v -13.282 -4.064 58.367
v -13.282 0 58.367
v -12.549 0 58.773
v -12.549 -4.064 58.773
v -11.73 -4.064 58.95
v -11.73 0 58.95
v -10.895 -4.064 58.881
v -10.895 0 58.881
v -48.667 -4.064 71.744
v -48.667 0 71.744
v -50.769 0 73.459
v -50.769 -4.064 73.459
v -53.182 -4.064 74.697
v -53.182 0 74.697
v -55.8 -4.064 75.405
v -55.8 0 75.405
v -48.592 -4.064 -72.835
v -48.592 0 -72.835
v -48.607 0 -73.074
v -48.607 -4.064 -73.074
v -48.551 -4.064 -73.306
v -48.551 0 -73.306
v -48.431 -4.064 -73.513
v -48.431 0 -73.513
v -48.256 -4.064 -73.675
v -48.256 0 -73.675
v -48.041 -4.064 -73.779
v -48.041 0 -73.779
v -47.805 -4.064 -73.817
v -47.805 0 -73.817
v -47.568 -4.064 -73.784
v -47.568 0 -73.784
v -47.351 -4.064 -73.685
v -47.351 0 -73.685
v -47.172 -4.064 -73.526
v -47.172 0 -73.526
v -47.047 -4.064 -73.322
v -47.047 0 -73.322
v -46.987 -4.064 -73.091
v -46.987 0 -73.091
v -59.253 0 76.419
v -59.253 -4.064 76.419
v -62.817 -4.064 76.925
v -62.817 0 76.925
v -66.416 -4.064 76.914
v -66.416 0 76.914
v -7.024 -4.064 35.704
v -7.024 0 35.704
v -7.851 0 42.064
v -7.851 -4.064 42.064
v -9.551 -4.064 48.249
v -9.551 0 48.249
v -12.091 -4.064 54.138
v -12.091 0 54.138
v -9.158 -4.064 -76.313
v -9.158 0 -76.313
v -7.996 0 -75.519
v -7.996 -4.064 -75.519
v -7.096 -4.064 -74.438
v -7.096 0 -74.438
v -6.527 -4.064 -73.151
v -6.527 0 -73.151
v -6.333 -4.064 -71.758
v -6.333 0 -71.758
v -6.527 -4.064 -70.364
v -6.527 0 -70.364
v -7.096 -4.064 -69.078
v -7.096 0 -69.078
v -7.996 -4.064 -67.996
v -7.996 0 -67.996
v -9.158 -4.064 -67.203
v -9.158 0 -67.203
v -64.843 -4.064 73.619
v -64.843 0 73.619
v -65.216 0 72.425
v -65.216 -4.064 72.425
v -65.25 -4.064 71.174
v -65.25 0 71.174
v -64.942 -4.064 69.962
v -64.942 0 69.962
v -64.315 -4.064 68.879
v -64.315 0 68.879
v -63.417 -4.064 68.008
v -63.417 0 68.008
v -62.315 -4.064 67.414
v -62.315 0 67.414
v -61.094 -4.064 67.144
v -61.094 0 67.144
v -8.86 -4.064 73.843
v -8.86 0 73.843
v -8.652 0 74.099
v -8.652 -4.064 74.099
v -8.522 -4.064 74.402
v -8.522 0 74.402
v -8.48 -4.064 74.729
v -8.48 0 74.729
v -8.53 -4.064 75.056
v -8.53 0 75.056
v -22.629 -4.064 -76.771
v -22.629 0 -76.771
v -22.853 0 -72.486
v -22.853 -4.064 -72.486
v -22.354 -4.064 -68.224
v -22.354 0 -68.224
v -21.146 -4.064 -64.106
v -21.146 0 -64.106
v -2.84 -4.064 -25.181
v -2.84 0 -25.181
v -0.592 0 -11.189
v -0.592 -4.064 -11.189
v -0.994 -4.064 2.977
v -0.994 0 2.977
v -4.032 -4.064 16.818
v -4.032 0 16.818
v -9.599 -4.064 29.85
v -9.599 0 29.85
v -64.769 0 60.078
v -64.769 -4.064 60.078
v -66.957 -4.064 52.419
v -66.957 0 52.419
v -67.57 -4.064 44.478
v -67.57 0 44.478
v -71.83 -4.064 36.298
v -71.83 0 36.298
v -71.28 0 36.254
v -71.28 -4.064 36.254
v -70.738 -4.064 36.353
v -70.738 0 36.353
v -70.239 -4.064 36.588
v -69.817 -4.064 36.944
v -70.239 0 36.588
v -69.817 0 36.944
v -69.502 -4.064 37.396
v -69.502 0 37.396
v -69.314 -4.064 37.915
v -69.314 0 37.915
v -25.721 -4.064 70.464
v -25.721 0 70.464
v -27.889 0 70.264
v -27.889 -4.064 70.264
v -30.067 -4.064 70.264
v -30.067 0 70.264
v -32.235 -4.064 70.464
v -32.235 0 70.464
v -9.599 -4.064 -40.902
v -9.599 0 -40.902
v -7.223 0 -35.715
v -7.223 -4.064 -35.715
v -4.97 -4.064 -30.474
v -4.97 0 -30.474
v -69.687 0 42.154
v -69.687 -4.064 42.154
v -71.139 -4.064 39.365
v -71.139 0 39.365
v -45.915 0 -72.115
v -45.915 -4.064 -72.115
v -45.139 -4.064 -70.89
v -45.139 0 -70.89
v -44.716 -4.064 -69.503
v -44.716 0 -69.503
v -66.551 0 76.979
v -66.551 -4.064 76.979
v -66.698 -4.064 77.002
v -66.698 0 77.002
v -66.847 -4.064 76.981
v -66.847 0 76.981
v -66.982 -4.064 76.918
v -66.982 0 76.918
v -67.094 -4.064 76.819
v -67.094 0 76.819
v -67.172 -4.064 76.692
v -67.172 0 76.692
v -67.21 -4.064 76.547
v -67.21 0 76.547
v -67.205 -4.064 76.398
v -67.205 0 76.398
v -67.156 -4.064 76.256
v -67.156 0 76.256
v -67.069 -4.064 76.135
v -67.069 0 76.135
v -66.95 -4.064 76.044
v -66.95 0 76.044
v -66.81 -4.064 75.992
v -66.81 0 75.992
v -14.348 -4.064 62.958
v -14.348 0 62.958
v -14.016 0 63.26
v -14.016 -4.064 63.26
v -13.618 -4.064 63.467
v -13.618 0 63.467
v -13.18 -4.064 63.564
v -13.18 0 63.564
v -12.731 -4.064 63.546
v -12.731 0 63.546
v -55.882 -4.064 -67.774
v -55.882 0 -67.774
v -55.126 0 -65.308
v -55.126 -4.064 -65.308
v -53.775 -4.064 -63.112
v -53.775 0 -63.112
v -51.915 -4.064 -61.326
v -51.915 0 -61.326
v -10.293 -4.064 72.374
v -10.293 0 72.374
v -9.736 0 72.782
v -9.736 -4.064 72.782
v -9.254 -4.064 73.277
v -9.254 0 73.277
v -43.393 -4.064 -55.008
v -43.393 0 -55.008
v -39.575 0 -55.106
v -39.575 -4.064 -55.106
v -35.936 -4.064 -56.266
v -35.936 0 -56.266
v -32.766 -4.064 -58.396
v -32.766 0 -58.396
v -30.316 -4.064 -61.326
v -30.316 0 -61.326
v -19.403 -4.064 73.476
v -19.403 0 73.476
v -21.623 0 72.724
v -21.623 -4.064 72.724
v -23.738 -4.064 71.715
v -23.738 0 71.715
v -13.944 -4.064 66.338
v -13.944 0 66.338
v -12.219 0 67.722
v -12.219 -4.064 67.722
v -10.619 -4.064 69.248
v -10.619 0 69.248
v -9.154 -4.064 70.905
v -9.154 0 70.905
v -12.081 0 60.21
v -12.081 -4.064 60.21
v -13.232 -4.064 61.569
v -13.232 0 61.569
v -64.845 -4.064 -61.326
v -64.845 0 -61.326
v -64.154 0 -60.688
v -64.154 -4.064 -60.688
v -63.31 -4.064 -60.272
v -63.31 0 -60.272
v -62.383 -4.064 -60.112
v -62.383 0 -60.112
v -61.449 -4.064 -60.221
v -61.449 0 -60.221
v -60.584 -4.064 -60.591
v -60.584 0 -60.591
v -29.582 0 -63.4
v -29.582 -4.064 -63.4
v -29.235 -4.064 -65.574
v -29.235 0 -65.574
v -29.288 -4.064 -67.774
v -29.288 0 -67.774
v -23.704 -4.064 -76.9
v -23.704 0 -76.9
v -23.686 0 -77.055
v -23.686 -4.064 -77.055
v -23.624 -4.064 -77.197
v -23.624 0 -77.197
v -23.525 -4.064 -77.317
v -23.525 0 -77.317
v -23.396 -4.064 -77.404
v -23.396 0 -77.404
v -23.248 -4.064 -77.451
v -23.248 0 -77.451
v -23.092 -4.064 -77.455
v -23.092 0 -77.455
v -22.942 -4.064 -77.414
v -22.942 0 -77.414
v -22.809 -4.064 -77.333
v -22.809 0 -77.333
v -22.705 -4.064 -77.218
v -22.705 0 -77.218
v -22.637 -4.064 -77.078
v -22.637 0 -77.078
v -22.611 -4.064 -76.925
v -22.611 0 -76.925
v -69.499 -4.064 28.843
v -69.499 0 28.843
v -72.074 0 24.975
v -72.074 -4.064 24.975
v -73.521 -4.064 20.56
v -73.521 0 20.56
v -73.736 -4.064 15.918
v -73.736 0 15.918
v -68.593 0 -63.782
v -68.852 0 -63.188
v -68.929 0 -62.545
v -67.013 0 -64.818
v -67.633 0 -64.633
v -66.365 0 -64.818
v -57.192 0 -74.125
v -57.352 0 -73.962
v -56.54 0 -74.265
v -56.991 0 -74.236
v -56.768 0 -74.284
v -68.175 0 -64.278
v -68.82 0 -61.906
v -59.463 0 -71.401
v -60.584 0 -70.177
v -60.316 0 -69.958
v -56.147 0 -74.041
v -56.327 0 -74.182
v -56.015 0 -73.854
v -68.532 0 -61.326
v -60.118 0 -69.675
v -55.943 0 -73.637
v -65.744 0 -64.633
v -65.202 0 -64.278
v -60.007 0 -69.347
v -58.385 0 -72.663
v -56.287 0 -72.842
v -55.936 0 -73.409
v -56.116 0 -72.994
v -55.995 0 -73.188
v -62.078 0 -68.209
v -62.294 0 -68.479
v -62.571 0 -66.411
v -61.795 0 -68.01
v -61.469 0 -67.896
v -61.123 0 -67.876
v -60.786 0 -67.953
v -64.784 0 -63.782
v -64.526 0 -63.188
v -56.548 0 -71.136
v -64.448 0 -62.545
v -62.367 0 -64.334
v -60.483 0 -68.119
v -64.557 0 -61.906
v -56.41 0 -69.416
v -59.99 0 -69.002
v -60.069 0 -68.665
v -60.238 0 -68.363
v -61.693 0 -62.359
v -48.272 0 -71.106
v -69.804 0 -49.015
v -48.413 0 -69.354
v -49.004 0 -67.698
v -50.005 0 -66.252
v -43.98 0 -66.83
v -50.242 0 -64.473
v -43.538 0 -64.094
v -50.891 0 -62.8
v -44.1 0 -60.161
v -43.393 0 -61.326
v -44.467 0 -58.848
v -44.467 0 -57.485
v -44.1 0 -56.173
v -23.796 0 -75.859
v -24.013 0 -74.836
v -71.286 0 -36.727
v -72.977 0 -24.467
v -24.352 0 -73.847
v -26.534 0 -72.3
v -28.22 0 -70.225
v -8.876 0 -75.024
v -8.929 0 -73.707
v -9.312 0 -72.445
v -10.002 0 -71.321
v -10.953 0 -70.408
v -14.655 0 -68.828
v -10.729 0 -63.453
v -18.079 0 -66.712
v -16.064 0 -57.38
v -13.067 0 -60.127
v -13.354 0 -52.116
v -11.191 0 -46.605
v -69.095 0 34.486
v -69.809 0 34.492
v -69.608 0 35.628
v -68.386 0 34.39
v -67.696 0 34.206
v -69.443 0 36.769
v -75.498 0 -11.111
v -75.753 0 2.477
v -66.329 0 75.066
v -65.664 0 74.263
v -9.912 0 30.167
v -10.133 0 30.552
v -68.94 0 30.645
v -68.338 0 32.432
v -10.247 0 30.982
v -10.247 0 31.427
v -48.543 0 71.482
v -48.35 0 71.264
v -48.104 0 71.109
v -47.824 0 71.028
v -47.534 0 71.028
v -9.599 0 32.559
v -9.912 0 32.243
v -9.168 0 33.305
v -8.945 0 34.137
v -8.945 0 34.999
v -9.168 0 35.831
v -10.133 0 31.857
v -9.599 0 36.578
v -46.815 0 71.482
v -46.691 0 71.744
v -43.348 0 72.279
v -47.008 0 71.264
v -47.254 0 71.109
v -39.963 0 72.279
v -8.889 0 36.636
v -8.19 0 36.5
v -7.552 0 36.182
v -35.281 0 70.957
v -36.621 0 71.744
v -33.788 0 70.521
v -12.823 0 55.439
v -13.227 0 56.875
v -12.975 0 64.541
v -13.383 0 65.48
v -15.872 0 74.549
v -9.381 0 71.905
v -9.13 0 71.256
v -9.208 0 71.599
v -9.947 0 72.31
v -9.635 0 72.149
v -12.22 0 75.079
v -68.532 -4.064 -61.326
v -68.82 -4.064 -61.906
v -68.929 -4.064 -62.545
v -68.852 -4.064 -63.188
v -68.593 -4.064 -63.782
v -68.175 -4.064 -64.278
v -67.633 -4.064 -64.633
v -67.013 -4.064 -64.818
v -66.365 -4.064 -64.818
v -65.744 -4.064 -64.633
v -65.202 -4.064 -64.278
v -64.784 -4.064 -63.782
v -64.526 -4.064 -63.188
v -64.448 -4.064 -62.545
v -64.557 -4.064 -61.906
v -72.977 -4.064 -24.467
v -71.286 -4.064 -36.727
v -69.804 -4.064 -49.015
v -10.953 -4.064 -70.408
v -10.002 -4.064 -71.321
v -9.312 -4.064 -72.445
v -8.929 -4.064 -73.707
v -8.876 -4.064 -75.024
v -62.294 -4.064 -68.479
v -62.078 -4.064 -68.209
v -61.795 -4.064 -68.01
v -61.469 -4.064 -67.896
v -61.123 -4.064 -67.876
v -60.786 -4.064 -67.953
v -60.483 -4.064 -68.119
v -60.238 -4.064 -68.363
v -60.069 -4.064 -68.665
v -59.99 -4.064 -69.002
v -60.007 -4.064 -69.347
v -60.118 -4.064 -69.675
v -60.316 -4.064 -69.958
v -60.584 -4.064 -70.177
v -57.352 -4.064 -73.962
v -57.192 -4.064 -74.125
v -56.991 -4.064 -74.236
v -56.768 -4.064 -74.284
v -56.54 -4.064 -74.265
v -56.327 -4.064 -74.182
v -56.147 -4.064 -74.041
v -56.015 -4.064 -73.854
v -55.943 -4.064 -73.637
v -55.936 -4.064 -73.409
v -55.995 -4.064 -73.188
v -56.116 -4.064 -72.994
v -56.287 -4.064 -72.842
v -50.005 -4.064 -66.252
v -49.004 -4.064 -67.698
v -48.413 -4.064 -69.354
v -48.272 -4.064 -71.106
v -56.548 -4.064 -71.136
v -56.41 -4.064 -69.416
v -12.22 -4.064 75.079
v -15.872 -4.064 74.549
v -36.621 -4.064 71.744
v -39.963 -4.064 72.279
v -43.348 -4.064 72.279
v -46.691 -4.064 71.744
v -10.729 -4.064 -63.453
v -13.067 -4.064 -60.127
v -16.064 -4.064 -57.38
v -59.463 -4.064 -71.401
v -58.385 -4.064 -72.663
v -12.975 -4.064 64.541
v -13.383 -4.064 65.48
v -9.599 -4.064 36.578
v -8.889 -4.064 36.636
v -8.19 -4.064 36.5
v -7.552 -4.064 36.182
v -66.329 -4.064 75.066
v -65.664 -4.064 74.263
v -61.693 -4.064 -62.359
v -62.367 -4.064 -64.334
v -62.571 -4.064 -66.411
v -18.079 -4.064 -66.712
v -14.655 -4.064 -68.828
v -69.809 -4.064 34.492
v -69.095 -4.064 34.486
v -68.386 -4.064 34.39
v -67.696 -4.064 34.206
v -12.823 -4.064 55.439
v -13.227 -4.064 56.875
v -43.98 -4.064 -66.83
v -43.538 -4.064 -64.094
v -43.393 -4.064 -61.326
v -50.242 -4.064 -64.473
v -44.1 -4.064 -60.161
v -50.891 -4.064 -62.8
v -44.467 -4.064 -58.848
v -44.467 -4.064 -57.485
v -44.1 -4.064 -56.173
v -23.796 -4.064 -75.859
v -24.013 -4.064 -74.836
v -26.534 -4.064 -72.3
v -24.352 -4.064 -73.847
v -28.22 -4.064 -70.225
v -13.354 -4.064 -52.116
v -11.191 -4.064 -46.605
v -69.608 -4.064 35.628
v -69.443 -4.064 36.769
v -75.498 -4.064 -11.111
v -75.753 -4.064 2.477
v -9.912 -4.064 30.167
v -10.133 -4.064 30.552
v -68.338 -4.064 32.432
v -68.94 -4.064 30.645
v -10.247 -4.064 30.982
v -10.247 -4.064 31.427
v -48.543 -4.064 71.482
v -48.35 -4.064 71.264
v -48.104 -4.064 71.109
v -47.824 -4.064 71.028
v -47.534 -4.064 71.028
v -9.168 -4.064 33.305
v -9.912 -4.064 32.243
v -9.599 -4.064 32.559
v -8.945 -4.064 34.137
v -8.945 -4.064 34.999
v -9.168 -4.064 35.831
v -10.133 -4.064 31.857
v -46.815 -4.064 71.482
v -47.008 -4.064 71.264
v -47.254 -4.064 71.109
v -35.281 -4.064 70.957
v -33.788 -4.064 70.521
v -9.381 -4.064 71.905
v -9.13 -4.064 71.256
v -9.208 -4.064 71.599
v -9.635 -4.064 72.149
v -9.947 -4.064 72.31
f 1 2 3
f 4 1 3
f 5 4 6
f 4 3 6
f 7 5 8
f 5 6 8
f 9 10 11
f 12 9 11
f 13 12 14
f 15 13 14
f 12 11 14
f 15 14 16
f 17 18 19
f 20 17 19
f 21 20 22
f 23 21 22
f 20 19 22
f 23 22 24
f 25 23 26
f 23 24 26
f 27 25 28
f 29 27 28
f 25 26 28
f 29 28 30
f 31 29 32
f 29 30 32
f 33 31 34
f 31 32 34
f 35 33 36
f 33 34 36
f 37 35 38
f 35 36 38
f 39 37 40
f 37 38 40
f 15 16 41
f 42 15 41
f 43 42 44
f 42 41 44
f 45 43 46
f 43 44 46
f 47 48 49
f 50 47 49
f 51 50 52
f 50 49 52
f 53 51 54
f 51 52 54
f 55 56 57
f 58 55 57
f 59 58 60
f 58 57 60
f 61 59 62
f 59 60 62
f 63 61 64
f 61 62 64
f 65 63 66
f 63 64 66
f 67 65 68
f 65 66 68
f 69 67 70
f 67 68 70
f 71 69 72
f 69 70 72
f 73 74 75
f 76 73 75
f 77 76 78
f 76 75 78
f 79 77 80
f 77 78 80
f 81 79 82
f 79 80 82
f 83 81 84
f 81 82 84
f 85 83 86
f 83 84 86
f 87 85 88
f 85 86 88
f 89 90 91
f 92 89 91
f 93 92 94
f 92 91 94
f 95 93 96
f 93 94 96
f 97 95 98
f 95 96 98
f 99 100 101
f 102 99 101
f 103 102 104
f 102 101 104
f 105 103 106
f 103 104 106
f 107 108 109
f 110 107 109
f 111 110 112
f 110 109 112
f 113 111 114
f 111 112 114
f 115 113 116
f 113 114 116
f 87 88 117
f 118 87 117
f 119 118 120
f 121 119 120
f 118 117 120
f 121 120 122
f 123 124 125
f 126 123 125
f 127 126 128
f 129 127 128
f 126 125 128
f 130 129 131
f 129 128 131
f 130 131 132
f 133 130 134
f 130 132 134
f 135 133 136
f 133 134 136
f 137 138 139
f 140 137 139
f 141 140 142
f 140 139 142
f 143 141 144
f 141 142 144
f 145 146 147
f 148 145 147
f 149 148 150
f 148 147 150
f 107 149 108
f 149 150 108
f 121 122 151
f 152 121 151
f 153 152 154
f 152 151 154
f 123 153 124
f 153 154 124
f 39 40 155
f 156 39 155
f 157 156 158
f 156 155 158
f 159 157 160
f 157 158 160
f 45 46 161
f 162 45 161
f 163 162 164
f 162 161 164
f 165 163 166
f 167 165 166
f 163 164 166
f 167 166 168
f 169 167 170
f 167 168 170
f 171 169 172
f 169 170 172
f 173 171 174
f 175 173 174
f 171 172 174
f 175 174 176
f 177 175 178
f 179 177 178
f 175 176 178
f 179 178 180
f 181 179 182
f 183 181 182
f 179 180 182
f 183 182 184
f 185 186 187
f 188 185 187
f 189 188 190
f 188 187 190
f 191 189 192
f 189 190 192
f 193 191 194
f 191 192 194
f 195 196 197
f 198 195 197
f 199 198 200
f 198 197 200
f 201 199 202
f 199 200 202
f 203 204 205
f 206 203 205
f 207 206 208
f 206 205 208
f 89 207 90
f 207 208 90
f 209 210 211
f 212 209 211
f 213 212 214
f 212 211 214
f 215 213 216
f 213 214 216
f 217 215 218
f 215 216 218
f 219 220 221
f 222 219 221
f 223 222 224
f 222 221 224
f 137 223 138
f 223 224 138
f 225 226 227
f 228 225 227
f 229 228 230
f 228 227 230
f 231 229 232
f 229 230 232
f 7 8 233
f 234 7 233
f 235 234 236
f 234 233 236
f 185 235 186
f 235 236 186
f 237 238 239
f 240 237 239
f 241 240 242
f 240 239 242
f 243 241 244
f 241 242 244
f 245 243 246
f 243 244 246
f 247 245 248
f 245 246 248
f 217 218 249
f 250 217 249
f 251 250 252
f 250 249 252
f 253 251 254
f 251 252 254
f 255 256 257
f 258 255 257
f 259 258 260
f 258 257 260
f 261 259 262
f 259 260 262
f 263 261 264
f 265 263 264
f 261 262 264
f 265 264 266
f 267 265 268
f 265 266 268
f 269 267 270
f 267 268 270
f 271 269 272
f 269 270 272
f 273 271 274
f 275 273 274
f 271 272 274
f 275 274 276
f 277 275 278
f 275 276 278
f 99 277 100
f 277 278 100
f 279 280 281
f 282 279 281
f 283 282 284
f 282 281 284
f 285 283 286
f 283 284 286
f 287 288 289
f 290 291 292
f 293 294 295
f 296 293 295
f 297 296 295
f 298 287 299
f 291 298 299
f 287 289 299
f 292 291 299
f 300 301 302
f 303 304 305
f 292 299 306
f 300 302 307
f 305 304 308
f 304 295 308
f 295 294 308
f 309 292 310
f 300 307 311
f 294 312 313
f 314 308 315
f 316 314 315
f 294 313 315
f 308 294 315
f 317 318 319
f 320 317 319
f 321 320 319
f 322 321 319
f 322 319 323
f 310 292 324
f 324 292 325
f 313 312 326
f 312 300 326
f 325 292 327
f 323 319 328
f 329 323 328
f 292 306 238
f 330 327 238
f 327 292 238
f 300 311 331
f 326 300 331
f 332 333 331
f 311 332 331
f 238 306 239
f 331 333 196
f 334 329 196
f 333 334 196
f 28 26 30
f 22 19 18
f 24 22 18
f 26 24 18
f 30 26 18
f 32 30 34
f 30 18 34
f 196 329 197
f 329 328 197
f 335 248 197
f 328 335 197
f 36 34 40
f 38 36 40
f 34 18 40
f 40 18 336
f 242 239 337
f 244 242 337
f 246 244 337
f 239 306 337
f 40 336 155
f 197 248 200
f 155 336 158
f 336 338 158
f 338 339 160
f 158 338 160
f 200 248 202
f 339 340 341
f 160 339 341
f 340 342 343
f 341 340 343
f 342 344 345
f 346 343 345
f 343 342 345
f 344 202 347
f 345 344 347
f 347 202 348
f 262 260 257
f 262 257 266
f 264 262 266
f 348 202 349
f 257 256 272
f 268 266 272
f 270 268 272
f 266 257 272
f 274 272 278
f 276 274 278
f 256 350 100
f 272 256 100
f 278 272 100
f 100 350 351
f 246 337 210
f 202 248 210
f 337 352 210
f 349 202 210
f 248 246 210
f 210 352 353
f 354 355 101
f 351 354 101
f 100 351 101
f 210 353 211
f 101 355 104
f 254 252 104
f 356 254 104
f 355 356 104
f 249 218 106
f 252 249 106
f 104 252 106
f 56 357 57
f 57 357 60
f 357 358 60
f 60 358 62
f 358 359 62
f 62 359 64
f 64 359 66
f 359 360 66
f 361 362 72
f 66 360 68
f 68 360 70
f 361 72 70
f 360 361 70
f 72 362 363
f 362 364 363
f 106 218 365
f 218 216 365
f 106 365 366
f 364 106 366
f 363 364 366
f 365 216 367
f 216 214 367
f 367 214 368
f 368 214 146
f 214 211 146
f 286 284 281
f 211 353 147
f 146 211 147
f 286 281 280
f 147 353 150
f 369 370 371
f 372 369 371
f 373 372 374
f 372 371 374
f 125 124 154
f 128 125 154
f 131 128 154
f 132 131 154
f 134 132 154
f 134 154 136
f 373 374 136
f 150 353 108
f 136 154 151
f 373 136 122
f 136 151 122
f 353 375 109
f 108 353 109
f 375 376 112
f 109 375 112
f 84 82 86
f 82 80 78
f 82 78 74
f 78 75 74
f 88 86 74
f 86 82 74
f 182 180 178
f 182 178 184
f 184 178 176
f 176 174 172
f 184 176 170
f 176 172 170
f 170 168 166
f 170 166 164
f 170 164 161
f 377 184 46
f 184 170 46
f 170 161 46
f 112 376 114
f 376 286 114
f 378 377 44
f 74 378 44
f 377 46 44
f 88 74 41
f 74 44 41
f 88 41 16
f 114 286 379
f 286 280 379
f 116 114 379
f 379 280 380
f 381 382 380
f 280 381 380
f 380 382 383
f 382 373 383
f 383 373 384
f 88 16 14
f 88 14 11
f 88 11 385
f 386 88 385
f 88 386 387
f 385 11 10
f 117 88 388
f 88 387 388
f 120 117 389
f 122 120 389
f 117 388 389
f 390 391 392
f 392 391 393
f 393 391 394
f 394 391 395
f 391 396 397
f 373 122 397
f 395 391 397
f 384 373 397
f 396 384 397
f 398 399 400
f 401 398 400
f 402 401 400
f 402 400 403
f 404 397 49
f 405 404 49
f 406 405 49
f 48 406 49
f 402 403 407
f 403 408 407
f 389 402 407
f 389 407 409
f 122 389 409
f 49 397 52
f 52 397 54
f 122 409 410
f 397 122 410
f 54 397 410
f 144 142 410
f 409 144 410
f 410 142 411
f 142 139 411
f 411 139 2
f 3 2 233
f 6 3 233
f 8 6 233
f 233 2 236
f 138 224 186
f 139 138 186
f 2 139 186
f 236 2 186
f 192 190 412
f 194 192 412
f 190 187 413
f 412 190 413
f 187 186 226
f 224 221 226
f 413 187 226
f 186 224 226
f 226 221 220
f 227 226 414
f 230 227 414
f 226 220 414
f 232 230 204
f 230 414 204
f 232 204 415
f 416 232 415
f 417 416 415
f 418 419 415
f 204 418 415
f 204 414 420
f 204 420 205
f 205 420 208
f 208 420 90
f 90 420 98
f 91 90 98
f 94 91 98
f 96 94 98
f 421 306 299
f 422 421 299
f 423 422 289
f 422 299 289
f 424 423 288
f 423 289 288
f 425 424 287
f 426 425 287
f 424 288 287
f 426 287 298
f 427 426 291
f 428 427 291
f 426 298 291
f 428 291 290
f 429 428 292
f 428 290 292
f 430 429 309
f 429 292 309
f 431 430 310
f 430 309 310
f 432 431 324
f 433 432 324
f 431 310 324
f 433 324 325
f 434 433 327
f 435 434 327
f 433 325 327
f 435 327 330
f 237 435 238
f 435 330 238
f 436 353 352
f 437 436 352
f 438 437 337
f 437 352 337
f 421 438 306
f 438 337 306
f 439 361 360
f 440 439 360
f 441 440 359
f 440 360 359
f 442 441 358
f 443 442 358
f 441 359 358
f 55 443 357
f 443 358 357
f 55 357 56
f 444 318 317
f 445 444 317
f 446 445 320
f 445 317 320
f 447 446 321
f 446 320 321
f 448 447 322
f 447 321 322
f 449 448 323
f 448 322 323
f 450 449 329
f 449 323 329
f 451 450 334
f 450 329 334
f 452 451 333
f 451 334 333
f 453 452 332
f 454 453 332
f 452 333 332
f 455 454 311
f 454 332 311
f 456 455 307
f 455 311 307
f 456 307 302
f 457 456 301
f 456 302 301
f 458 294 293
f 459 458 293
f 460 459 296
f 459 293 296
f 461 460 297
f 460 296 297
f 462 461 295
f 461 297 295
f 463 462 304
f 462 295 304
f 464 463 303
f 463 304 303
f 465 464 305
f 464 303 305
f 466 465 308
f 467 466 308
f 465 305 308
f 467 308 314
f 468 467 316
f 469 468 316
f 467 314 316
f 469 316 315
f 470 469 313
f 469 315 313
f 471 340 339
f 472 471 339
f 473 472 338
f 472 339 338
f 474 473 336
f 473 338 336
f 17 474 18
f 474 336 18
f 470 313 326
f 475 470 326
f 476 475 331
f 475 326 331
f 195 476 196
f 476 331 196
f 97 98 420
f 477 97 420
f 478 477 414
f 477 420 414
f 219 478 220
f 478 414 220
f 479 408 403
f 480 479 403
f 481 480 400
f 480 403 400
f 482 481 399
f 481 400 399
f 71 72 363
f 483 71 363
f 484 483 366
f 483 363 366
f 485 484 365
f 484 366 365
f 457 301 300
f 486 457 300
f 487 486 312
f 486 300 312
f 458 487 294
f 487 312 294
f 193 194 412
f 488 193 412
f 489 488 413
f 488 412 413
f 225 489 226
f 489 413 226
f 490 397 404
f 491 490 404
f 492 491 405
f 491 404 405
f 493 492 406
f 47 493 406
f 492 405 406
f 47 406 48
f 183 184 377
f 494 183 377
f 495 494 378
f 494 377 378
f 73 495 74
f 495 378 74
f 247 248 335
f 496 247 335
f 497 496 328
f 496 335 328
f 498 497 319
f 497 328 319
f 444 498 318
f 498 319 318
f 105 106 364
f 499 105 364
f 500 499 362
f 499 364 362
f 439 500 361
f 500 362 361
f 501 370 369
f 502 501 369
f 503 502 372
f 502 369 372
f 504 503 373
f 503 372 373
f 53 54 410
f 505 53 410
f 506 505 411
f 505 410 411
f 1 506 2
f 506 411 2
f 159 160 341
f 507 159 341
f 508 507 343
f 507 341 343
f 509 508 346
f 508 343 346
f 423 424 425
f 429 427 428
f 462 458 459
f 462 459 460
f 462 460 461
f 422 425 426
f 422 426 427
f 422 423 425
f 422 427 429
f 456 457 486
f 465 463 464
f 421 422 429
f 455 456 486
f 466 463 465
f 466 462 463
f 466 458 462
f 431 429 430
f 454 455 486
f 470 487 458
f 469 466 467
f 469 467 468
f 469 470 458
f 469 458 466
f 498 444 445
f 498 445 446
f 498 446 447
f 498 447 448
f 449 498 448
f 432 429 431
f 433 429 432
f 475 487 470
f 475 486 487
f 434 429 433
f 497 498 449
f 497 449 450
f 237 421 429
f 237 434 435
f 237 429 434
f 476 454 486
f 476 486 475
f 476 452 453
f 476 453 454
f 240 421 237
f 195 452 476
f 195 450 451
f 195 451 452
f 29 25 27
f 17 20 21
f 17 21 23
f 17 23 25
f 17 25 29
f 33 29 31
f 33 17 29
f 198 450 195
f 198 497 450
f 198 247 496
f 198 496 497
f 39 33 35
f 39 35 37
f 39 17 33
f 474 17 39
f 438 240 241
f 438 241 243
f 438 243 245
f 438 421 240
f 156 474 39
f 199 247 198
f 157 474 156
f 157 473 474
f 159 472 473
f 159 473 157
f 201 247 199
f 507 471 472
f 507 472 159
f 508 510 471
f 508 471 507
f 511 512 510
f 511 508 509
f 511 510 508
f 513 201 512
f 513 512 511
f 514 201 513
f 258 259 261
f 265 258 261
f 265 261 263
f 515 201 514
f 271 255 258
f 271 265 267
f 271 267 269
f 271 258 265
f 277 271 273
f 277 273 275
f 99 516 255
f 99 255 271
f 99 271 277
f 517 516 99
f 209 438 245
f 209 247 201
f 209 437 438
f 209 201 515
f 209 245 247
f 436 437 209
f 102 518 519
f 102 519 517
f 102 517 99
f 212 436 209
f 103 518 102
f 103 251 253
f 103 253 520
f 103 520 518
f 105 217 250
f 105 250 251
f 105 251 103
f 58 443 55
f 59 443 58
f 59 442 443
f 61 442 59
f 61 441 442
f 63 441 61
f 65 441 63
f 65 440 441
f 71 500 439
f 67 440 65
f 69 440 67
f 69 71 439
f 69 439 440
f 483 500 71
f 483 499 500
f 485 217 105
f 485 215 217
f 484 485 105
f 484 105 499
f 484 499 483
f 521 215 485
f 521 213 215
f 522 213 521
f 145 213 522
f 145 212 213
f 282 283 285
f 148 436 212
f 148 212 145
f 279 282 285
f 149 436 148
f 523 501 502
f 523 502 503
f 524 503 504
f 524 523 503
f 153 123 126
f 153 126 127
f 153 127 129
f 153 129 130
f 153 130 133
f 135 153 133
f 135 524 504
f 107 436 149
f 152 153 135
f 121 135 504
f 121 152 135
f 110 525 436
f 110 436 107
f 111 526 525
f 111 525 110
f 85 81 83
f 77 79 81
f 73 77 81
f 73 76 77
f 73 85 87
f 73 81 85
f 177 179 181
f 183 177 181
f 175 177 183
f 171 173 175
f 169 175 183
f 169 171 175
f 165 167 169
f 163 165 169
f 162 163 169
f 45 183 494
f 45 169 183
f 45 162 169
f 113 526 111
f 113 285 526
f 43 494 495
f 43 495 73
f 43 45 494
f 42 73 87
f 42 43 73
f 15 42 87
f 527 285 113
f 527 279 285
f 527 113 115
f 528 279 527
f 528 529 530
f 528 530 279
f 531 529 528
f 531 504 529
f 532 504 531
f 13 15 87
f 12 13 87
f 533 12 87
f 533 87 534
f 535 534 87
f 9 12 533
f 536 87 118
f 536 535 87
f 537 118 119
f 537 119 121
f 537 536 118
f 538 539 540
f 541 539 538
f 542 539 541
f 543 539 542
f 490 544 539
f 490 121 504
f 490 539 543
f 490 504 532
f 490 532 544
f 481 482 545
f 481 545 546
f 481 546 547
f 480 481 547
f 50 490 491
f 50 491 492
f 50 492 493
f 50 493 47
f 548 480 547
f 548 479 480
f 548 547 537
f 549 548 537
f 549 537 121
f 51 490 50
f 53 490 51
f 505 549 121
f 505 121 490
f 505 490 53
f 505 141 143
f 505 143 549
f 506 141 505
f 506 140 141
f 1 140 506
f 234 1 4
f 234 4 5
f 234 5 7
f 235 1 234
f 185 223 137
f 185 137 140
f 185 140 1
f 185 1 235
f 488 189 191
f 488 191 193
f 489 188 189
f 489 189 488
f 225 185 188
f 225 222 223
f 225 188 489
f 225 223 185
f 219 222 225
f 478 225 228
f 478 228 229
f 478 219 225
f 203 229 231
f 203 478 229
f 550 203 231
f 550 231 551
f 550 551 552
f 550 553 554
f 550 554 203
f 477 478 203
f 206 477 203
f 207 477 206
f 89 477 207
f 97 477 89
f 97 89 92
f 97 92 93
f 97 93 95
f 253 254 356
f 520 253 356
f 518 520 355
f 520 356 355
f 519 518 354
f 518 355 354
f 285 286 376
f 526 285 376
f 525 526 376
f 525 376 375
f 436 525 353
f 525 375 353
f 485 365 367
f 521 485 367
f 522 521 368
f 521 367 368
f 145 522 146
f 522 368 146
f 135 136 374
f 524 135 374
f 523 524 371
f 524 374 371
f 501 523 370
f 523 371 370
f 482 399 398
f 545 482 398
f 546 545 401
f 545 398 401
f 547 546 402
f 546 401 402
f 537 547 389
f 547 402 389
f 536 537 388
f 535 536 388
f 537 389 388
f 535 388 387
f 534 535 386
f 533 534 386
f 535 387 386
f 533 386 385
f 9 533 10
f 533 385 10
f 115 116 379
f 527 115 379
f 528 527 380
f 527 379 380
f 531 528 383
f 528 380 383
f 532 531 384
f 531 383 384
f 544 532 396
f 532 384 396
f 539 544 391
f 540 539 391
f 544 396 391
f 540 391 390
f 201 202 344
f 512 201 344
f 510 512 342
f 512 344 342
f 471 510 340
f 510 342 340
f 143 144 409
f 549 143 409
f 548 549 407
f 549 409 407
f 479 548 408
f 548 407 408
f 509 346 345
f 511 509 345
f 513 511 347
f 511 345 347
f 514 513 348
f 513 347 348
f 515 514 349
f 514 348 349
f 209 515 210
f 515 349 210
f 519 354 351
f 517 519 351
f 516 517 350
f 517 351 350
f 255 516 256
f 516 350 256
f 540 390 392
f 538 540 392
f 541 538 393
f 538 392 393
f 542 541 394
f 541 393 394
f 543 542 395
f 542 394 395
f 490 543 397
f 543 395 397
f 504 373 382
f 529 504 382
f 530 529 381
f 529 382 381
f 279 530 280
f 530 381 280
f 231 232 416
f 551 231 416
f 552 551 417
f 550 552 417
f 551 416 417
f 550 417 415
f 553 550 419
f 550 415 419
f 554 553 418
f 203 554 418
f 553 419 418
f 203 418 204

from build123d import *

# Parameters (mm, degrees)
F1_DEPTH = 4.064


with BuildPart() as f1:
    # F0 (on Front) → F1 (new body)
    with BuildSketch(Plane.XZ):
        with BuildLine():
            ThreePointArc((-66.415959, 76.914086), (-67.172145, 76.691627), (-66.809714, 75.991663))
            ThreePointArc((-66.809714, 75.991663), (-66.017951, 74.646721), (-64.843036, 73.619425))
            ThreePointArc((-64.843036, 73.619425), (-64.666112, 69.398687), (-61.0939, 67.143641))
            ThreePointArc((-61.0939, 67.143641), (-66.055858, 56.303612), (-67.569681, 44.478402))
            ThreePointArc((-67.569681, 44.478402), (-70.50287, 40.806661), (-71.830064, 36.298465))
            ThreePointArc((-71.830064, 36.298465), (-70.238683, 36.587844), (-69.314263, 37.915128))
            ThreePointArc((-69.314263, 37.915128), (-69.520495, 36.197783), (-69.80937, 34.492392))
            ThreePointArc((-69.80937, 34.492392), (-68.738891, 34.449604), (-67.69567, 34.205791))
            ThreePointArc((-67.69567, 34.205791), (-68.644172, 31.540218), (-69.49908, 28.84317))
            ThreePointArc((-69.49908, 28.84317), (-72.946881, 22.816432), (-73.735699, 15.918123))
            ThreePointArc((-73.735699, 15.918123), (-75.910649, -4.322399), (-72.977036, -24.466952))
            ThreePointArc((-72.977036, -24.466952), (-70.518883, -42.867891), (-68.532197, -61.325684))
            ThreePointArc((-68.532197, -61.325684), (-66.688611, -64.841953), (-64.845026, -61.325684))
            ThreePointArc((-64.845026, -61.325684), (-62.852462, -60.158363), (-60.584038, -60.591031))
            ThreePointArc((-60.584038, -60.591031), (-62.366804, -64.333838), (-62.294377, -68.47891))
            ThreePointArc((-62.294377, -68.47891), (-60.351727, -68.232553), (-60.584038, -70.176932))
            ThreePointArc((-60.584038, -70.176932), (-58.918947, -72.027605), (-57.351563, -73.961727))
            ThreePointArc((-57.351563, -73.961727), (-56.146991, -74.041168), (-56.287132, -72.842141))
            ThreePointArc((-56.287132, -72.842141), (-56.528845, -70.272437), (-55.882256, -67.773692))
            ThreePointArc((-55.882256, -67.773692), (-54.520205, -64.167303), (-51.915128, -61.325684))
            ThreePointArc((-51.915128, -61.325684), (-50.51679, -63.617178), (-50.00503, -66.252401))
            ThreePointArc((-50.00503, -66.252401), (-48.412524, -69.353697), (-48.59242, -72.835328))
            ThreePointArc((-48.59242, -72.835328), (-47.924139, -73.806953), (-46.987015, -73.091094))
            ThreePointArc((-46.987015, -73.091094), (-45.486049, -71.528376), (-44.715524, -69.503214))
            ThreePointArc((-44.715524, -69.503214), (-43.721814, -65.468221), (-43.39315, -61.325684))
            ThreePointArc((-43.39315, -61.325684), (-44.513459, -58.166673), (-43.39315, -55.007663))
            ThreePointArc((-43.39315, -55.007663), (-35.936491, -56.266123), (-30.316319, -61.325684))
            ThreePointArc((-30.316319, -61.325684), (-29.359215, -64.47905), (-29.287802, -67.773692))
            ThreePointArc((-29.287802, -67.773692), (-27.447605, -71.320201), (-24.352325, -73.846719))
            ThreePointArc((-24.352325, -73.846719), (-23.889052, -75.343964), (-23.704438, -76.900333))
            ThreePointArc((-23.704438, -76.900333), (-23.092076, -77.454732), (-22.629103, -76.770626))
            ThreePointArc((-22.629103, -76.770626), (-22.69355, -70.344178), (-21.146461, -64.106397))
            ThreePointArc((-21.146461, -64.106397), (-16.406969, -67.834653), (-10.9533, -70.407622))
            ThreePointArc((-10.9533, -70.407622), (-9.080009, -73.063494), (-9.1583, -76.312609))
            ThreePointArc((-9.1583, -76.312609), (-6.332531, -71.75776), (-9.1583, -67.202911))
            ThreePointArc((-9.1583, -67.202911), (-11.807812, -61.726767), (-16.064042, -57.380209))
            ThreePointArc((-16.064042, -57.380209), (-12.202431, -49.388101), (-9.599092, -40.90232))
            ThreePointArc((-9.599092, -40.90232), (-6.08091, -33.101189), (-2.84028, -25.180737))
            ThreePointArc((-2.84028, -25.180737), (-0.994144, 2.976639), (-9.599092, 29.850435))
            ThreePointArc((-9.599092, 29.850435), (-10.261747, 31.2046), (-9.599092, 32.558765))
            ThreePointArc((-9.599092, 32.558765), (-8.917225, 34.568172), (-9.599092, 36.577579))
            ThreePointArc((-9.599092, 36.577579), (-8.189599, 36.500467), (-7.024208, 35.703924))
            ThreePointArc((-7.024208, 35.703924), (-8.593374, 45.18609), (-12.091408, 54.138046))
            ThreePointArc((-12.091408, 54.138046), (-13.067545, 56.145089), (-13.282336, 58.366559))
            ThreePointArc((-13.282336, 58.366559), (-12.146196, 58.89145), (-10.894712, 58.880817))
            ThreePointArc((-10.894712, 58.880817), (-12.661005, 60.885727), (-14.347583, 62.958144))
            ThreePointArc((-14.347583, 62.958144), (-13.617504, 63.466614), (-12.731345, 63.545868))
            ThreePointArc((-12.731345, 63.545868), (-13.158819, 65.019265), (-13.943524, 66.337548))
            ThreePointArc((-13.943524, 66.337548), (-11.402644, 68.467779), (-9.15432, 70.904784))
            ThreePointArc((-9.15432, 70.904784), (-9.381127, 71.904914), (-10.293034, 72.374091))
            ThreePointArc((-10.293034, 72.374091), (-9.485105, 73.019394), (-8.860459, 73.843397))
            ThreePointArc((-8.860459, 73.843397), (-8.522262, 74.402333), (-8.529865, 75.055577))
            ThreePointArc((-8.529865, 75.055577), (-14.055948, 74.882941), (-19.402735, 73.476076))
            ThreePointArc((-19.402735, 73.476076), (-22.695461, 72.250511), (-25.720755, 70.463993))
            ThreePointArc((-25.720755, 70.463993), (-28.977803, 70.239264), (-32.234851, 70.463993))
            ThreePointArc((-32.234851, 70.463993), (-34.548049, 70.692721), (-36.621001, 71.74442))
            ThreePointArc((-36.621001, 71.74442), (-41.655805, 72.345638), (-46.690609, 71.74442))
            ThreePointArc((-46.690609, 71.74442), (-47.679037, 71.017736), (-48.667464, 71.74442))
            ThreePointArc((-48.667464, 71.74442), (-51.942994, 74.141168), (-55.799965, 75.405002))
            ThreePointArc((-55.799965, 75.405002), (-61.025995, 76.736158), (-66.415959, 76.914086))
        make_face()
    extrude(amount=F1_DEPTH)


solid = f1.part
